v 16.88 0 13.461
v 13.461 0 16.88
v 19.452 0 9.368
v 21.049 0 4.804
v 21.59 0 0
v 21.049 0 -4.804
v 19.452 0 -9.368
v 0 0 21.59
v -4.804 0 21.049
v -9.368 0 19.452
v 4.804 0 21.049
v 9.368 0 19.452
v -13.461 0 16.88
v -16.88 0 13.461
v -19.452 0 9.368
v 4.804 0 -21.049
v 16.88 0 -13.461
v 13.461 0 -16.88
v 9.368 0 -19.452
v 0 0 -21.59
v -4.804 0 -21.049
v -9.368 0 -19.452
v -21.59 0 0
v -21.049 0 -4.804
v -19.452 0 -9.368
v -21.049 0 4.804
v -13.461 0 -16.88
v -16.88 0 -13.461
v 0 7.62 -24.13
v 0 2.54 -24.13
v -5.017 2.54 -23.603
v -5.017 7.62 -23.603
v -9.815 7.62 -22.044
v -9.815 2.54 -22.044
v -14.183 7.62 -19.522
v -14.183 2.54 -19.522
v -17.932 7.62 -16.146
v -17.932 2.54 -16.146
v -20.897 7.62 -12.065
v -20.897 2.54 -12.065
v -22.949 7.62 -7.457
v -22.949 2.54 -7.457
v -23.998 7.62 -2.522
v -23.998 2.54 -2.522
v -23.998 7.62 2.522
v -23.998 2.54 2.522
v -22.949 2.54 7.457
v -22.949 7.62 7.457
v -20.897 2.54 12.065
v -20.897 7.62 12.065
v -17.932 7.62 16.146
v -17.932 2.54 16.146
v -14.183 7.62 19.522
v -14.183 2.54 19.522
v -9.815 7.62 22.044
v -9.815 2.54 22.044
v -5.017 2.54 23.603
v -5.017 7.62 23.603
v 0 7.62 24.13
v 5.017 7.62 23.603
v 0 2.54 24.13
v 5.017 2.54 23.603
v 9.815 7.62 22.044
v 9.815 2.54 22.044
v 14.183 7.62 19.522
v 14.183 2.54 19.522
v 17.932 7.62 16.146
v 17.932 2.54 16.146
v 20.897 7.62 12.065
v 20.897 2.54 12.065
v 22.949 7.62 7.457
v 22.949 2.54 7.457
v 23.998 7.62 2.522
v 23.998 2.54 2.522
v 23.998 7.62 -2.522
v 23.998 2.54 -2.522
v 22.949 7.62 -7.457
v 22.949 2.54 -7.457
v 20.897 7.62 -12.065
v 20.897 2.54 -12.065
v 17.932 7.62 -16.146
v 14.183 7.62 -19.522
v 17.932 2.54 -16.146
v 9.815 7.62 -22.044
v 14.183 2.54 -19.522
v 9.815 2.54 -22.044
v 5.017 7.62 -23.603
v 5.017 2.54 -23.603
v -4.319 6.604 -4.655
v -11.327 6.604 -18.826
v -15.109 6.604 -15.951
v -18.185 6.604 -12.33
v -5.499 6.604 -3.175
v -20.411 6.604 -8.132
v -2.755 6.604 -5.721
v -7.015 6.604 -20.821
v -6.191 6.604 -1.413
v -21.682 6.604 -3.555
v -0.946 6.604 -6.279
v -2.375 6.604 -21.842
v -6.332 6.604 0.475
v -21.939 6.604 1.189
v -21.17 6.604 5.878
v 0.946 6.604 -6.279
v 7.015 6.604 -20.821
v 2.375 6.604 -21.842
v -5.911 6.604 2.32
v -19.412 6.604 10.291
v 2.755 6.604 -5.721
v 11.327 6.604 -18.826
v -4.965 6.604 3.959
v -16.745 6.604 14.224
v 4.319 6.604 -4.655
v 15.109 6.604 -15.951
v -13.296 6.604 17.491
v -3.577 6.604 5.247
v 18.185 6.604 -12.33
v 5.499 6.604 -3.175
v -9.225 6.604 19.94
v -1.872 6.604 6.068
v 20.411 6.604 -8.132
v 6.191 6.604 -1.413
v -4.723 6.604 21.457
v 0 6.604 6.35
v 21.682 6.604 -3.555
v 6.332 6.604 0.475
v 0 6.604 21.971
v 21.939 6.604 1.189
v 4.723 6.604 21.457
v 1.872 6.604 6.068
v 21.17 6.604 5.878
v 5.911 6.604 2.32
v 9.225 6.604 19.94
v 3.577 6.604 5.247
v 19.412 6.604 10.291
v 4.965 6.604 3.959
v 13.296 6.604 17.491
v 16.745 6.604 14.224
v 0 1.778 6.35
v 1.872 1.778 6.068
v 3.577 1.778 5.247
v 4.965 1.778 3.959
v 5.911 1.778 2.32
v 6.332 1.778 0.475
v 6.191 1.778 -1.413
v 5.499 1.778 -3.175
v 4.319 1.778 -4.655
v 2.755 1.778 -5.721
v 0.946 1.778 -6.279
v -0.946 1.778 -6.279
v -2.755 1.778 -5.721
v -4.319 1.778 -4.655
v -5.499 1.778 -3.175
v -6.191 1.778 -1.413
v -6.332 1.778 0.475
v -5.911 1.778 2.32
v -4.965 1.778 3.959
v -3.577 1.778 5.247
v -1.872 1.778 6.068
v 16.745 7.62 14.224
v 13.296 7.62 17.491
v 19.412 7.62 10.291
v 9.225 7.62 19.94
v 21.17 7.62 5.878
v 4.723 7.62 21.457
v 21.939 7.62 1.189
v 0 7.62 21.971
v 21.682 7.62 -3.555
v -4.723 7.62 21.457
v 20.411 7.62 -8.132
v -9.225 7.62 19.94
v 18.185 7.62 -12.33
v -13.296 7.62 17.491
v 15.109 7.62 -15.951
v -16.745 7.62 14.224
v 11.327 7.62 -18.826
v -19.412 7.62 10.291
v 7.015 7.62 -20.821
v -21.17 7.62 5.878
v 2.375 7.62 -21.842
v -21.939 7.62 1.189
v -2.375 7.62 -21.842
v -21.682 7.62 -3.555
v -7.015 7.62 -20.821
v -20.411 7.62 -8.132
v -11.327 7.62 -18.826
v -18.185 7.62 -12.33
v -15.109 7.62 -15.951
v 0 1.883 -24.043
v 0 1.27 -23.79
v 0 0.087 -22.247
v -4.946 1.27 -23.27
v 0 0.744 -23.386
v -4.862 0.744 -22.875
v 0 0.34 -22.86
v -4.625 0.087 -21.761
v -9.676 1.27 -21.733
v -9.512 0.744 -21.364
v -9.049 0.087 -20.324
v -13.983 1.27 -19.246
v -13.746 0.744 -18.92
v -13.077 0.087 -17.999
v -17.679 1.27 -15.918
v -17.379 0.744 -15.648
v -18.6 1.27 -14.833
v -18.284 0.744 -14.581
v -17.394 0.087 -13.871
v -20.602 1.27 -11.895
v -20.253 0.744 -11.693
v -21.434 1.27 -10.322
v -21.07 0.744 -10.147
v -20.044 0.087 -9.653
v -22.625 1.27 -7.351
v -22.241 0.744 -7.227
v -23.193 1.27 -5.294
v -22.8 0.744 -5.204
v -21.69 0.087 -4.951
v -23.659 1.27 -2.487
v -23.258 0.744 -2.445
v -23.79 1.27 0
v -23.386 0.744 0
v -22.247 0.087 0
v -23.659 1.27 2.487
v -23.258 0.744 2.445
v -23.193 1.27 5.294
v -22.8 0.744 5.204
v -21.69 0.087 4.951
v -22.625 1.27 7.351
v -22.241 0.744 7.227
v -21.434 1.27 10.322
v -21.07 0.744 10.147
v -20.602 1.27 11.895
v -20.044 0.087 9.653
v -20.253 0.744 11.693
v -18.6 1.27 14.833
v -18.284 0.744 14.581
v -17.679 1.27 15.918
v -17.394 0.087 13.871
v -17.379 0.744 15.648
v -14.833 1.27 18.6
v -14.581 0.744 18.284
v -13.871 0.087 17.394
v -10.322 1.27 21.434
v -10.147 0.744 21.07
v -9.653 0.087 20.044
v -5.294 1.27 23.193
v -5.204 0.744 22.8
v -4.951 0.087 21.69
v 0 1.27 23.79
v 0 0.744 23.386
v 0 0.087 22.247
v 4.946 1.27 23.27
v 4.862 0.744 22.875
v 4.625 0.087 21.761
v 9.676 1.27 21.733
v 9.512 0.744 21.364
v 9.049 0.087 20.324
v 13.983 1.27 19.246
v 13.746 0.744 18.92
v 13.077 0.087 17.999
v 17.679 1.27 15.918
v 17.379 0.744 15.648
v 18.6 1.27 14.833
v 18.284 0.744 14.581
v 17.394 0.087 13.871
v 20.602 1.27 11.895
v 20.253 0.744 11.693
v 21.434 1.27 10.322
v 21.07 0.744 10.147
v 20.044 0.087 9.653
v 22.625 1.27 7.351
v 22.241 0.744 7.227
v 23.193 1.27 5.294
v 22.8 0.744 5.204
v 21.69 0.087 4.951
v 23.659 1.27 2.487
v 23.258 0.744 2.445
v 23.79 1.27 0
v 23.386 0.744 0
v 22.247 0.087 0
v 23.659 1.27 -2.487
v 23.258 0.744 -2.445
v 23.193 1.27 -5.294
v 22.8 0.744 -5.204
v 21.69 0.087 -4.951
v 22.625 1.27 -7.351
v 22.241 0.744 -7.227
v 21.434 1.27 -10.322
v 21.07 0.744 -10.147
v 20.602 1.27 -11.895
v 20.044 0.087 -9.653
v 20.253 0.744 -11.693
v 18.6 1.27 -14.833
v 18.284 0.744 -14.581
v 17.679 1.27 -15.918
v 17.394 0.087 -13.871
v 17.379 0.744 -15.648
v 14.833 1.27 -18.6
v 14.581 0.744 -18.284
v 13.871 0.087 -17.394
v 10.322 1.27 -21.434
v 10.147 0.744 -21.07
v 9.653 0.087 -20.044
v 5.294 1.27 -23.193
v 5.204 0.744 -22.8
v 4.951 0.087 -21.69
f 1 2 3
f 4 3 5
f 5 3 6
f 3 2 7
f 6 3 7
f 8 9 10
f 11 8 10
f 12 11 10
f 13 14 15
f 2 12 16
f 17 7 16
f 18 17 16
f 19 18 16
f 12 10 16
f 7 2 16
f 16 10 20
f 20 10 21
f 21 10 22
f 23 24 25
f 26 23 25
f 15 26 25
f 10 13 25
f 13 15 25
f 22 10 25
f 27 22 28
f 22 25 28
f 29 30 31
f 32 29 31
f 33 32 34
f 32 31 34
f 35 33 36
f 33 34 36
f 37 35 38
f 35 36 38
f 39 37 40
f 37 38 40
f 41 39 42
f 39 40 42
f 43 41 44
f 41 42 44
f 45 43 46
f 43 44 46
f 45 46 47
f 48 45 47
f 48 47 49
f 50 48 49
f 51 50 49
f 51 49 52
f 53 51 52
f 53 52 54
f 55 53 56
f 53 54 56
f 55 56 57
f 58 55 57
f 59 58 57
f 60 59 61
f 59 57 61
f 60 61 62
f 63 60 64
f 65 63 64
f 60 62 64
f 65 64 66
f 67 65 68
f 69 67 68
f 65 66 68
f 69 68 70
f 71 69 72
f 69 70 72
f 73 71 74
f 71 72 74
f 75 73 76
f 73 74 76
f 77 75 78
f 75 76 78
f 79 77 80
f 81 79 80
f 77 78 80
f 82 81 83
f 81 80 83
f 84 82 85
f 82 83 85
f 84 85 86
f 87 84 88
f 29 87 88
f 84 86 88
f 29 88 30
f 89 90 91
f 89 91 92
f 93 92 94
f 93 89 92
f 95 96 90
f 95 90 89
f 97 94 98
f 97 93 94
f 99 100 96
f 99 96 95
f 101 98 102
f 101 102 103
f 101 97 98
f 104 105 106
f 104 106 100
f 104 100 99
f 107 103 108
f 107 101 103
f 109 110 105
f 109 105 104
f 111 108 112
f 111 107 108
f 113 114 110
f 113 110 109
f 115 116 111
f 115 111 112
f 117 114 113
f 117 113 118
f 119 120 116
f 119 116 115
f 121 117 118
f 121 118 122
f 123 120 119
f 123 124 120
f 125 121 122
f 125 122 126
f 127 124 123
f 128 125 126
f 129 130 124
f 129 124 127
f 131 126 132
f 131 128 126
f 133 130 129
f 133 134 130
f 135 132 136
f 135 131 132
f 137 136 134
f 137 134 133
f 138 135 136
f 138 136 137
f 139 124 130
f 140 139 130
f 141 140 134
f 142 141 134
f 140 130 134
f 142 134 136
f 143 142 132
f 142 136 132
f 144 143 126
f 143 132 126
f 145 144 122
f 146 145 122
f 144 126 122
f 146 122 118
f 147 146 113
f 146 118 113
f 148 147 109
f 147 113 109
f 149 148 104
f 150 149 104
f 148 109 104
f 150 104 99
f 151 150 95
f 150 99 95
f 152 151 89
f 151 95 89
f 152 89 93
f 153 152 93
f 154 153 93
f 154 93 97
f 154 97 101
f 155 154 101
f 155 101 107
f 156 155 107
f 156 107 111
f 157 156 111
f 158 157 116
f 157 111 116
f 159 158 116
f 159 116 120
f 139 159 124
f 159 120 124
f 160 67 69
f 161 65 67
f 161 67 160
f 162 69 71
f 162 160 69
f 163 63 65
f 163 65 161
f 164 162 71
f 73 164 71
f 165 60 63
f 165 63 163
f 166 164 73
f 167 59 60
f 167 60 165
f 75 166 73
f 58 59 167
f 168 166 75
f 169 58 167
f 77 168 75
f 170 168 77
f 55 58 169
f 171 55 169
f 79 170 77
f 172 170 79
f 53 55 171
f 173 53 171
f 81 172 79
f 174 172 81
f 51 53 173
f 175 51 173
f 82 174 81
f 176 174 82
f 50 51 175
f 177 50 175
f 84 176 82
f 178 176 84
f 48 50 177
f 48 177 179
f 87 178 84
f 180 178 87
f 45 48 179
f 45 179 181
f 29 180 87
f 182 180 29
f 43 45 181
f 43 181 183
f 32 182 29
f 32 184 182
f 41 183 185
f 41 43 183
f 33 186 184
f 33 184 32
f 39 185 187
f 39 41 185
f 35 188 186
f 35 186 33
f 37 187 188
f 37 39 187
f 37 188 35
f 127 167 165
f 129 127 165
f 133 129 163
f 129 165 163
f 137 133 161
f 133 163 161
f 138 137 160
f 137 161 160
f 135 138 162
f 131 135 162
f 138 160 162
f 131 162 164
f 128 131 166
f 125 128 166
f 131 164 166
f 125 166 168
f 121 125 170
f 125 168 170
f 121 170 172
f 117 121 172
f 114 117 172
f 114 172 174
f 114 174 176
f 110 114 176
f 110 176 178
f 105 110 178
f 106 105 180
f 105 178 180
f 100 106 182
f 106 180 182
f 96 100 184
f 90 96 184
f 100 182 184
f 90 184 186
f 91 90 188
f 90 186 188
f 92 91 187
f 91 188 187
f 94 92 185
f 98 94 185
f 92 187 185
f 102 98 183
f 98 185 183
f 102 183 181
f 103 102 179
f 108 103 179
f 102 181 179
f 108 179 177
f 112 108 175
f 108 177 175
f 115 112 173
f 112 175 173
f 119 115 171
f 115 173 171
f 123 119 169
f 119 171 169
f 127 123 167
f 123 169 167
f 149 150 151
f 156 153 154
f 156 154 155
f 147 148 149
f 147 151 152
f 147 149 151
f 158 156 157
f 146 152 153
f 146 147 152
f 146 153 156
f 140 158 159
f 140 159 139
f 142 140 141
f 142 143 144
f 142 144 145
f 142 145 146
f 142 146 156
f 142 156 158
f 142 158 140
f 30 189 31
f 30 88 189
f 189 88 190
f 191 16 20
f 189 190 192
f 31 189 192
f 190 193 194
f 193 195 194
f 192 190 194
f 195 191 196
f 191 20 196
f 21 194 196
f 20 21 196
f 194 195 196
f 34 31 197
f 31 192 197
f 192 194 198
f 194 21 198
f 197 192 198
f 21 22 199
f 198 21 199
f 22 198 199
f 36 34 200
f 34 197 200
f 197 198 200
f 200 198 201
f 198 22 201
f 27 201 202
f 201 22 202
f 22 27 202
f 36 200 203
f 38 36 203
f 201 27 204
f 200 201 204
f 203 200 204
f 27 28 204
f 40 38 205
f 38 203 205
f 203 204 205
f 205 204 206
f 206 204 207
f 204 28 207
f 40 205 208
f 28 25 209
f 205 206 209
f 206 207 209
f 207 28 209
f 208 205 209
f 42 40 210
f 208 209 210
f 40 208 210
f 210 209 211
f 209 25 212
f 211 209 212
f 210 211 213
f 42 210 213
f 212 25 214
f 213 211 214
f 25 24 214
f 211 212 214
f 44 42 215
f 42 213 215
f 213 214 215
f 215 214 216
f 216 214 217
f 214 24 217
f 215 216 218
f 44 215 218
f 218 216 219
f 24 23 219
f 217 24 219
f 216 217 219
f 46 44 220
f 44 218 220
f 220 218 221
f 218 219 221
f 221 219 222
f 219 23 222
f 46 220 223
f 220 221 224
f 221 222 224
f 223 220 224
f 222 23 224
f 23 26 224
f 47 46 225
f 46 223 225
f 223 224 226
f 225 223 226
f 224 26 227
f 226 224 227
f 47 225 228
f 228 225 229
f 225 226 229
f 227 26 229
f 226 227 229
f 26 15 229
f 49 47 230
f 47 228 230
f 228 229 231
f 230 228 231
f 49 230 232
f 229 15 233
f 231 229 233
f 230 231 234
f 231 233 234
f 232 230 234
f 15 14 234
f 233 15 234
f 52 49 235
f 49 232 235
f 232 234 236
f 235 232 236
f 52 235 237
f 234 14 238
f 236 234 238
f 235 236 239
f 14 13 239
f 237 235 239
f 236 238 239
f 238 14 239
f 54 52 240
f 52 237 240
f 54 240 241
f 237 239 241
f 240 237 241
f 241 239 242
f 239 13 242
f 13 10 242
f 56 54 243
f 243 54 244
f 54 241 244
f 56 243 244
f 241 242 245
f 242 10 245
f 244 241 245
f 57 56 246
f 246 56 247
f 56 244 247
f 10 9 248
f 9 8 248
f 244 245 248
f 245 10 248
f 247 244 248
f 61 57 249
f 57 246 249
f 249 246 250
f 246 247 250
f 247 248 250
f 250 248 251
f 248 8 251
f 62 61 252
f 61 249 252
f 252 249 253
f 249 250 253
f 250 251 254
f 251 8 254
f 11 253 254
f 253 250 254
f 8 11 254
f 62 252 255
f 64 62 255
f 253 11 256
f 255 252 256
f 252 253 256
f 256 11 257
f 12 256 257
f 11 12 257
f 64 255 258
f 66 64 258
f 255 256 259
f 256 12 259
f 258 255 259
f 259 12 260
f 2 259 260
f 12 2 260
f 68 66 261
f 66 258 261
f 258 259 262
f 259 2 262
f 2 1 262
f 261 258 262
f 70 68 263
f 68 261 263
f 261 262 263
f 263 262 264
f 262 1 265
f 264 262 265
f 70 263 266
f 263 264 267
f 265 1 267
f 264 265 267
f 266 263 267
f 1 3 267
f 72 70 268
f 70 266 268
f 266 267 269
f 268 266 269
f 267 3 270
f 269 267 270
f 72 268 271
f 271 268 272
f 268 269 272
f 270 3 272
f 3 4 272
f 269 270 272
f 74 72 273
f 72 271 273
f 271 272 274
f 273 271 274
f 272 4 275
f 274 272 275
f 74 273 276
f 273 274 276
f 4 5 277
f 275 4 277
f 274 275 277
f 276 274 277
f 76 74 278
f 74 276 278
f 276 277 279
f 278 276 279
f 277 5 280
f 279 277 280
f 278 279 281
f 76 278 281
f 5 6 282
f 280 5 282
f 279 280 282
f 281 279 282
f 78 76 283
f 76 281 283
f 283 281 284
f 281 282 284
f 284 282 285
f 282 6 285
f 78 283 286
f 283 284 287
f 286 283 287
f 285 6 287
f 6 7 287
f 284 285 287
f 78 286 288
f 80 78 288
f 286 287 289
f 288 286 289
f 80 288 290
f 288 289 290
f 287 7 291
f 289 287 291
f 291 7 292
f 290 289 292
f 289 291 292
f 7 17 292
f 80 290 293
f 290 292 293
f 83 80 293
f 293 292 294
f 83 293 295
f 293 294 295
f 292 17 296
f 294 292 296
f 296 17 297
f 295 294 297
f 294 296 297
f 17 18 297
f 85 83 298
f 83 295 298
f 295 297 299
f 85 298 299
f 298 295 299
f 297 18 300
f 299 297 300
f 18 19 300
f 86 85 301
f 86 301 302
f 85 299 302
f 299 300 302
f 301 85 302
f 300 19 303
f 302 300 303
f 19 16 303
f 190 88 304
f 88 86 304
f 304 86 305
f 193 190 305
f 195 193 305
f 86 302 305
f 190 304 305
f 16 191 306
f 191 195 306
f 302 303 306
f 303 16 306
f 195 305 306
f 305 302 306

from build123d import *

# Parameters (mm, degrees)
SKETCH2_R           = 24.13
BOSS_EXTRUDE1_DEPTH = 7.62
SKETCH3_R           = 21.971
CUT_EXTRUDE1_DEPTH  = 1.016
SKETCH4_R           = 6.35
CUT_EXTRUDE2_DEPTH  = 4.826
FILLET1_R           = 2.54


with BuildPart() as part:
    # Sketch2 → Boss-Extrude1 (new body)
    with BuildSketch(Plane(origin=(0, 0, 0), x_dir=(1, 0, 0), z_dir=(0, 1, 0))):
        with Locations(Location((0, 0, 0), (0, 0, 90))):
            Circle(SKETCH2_R)
    extrude(amount=BOSS_EXTRUDE1_DEPTH)

    # Sketch3 → Cut-Extrude1 (cut)
    with BuildSketch(Plane(origin=(0, 7.62, 0), x_dir=(1, 0, 0), z_dir=(0, 1, 0))):
        with Locations(Location((0, 0, 0), (0, 0, 270))):
            Circle(SKETCH3_R)
    extrude(amount=-CUT_EXTRUDE1_DEPTH, mode=Mode.SUBTRACT)

    # Sketch4 → Cut-Extrude2 (cut)
    with BuildSketch(Plane(origin=(0, 6.604, 0), x_dir=(1, 0, 0), z_dir=(0, 1, 0))):
        with Locations(Location((0, 0, 0), (0, 0, 270))):
            Circle(SKETCH4_R)
    extrude(amount=-CUT_EXTRUDE2_DEPTH, mode=Mode.SUBTRACT)

    # Fillet1
    fillet1_edges = [part.edges().sort_by_distance(p)[0] for p in [
        (0, 0, 24.13),
    ]]
    fillet(fillet1_edges, radius=FILLET1_R)


solid = part.part
